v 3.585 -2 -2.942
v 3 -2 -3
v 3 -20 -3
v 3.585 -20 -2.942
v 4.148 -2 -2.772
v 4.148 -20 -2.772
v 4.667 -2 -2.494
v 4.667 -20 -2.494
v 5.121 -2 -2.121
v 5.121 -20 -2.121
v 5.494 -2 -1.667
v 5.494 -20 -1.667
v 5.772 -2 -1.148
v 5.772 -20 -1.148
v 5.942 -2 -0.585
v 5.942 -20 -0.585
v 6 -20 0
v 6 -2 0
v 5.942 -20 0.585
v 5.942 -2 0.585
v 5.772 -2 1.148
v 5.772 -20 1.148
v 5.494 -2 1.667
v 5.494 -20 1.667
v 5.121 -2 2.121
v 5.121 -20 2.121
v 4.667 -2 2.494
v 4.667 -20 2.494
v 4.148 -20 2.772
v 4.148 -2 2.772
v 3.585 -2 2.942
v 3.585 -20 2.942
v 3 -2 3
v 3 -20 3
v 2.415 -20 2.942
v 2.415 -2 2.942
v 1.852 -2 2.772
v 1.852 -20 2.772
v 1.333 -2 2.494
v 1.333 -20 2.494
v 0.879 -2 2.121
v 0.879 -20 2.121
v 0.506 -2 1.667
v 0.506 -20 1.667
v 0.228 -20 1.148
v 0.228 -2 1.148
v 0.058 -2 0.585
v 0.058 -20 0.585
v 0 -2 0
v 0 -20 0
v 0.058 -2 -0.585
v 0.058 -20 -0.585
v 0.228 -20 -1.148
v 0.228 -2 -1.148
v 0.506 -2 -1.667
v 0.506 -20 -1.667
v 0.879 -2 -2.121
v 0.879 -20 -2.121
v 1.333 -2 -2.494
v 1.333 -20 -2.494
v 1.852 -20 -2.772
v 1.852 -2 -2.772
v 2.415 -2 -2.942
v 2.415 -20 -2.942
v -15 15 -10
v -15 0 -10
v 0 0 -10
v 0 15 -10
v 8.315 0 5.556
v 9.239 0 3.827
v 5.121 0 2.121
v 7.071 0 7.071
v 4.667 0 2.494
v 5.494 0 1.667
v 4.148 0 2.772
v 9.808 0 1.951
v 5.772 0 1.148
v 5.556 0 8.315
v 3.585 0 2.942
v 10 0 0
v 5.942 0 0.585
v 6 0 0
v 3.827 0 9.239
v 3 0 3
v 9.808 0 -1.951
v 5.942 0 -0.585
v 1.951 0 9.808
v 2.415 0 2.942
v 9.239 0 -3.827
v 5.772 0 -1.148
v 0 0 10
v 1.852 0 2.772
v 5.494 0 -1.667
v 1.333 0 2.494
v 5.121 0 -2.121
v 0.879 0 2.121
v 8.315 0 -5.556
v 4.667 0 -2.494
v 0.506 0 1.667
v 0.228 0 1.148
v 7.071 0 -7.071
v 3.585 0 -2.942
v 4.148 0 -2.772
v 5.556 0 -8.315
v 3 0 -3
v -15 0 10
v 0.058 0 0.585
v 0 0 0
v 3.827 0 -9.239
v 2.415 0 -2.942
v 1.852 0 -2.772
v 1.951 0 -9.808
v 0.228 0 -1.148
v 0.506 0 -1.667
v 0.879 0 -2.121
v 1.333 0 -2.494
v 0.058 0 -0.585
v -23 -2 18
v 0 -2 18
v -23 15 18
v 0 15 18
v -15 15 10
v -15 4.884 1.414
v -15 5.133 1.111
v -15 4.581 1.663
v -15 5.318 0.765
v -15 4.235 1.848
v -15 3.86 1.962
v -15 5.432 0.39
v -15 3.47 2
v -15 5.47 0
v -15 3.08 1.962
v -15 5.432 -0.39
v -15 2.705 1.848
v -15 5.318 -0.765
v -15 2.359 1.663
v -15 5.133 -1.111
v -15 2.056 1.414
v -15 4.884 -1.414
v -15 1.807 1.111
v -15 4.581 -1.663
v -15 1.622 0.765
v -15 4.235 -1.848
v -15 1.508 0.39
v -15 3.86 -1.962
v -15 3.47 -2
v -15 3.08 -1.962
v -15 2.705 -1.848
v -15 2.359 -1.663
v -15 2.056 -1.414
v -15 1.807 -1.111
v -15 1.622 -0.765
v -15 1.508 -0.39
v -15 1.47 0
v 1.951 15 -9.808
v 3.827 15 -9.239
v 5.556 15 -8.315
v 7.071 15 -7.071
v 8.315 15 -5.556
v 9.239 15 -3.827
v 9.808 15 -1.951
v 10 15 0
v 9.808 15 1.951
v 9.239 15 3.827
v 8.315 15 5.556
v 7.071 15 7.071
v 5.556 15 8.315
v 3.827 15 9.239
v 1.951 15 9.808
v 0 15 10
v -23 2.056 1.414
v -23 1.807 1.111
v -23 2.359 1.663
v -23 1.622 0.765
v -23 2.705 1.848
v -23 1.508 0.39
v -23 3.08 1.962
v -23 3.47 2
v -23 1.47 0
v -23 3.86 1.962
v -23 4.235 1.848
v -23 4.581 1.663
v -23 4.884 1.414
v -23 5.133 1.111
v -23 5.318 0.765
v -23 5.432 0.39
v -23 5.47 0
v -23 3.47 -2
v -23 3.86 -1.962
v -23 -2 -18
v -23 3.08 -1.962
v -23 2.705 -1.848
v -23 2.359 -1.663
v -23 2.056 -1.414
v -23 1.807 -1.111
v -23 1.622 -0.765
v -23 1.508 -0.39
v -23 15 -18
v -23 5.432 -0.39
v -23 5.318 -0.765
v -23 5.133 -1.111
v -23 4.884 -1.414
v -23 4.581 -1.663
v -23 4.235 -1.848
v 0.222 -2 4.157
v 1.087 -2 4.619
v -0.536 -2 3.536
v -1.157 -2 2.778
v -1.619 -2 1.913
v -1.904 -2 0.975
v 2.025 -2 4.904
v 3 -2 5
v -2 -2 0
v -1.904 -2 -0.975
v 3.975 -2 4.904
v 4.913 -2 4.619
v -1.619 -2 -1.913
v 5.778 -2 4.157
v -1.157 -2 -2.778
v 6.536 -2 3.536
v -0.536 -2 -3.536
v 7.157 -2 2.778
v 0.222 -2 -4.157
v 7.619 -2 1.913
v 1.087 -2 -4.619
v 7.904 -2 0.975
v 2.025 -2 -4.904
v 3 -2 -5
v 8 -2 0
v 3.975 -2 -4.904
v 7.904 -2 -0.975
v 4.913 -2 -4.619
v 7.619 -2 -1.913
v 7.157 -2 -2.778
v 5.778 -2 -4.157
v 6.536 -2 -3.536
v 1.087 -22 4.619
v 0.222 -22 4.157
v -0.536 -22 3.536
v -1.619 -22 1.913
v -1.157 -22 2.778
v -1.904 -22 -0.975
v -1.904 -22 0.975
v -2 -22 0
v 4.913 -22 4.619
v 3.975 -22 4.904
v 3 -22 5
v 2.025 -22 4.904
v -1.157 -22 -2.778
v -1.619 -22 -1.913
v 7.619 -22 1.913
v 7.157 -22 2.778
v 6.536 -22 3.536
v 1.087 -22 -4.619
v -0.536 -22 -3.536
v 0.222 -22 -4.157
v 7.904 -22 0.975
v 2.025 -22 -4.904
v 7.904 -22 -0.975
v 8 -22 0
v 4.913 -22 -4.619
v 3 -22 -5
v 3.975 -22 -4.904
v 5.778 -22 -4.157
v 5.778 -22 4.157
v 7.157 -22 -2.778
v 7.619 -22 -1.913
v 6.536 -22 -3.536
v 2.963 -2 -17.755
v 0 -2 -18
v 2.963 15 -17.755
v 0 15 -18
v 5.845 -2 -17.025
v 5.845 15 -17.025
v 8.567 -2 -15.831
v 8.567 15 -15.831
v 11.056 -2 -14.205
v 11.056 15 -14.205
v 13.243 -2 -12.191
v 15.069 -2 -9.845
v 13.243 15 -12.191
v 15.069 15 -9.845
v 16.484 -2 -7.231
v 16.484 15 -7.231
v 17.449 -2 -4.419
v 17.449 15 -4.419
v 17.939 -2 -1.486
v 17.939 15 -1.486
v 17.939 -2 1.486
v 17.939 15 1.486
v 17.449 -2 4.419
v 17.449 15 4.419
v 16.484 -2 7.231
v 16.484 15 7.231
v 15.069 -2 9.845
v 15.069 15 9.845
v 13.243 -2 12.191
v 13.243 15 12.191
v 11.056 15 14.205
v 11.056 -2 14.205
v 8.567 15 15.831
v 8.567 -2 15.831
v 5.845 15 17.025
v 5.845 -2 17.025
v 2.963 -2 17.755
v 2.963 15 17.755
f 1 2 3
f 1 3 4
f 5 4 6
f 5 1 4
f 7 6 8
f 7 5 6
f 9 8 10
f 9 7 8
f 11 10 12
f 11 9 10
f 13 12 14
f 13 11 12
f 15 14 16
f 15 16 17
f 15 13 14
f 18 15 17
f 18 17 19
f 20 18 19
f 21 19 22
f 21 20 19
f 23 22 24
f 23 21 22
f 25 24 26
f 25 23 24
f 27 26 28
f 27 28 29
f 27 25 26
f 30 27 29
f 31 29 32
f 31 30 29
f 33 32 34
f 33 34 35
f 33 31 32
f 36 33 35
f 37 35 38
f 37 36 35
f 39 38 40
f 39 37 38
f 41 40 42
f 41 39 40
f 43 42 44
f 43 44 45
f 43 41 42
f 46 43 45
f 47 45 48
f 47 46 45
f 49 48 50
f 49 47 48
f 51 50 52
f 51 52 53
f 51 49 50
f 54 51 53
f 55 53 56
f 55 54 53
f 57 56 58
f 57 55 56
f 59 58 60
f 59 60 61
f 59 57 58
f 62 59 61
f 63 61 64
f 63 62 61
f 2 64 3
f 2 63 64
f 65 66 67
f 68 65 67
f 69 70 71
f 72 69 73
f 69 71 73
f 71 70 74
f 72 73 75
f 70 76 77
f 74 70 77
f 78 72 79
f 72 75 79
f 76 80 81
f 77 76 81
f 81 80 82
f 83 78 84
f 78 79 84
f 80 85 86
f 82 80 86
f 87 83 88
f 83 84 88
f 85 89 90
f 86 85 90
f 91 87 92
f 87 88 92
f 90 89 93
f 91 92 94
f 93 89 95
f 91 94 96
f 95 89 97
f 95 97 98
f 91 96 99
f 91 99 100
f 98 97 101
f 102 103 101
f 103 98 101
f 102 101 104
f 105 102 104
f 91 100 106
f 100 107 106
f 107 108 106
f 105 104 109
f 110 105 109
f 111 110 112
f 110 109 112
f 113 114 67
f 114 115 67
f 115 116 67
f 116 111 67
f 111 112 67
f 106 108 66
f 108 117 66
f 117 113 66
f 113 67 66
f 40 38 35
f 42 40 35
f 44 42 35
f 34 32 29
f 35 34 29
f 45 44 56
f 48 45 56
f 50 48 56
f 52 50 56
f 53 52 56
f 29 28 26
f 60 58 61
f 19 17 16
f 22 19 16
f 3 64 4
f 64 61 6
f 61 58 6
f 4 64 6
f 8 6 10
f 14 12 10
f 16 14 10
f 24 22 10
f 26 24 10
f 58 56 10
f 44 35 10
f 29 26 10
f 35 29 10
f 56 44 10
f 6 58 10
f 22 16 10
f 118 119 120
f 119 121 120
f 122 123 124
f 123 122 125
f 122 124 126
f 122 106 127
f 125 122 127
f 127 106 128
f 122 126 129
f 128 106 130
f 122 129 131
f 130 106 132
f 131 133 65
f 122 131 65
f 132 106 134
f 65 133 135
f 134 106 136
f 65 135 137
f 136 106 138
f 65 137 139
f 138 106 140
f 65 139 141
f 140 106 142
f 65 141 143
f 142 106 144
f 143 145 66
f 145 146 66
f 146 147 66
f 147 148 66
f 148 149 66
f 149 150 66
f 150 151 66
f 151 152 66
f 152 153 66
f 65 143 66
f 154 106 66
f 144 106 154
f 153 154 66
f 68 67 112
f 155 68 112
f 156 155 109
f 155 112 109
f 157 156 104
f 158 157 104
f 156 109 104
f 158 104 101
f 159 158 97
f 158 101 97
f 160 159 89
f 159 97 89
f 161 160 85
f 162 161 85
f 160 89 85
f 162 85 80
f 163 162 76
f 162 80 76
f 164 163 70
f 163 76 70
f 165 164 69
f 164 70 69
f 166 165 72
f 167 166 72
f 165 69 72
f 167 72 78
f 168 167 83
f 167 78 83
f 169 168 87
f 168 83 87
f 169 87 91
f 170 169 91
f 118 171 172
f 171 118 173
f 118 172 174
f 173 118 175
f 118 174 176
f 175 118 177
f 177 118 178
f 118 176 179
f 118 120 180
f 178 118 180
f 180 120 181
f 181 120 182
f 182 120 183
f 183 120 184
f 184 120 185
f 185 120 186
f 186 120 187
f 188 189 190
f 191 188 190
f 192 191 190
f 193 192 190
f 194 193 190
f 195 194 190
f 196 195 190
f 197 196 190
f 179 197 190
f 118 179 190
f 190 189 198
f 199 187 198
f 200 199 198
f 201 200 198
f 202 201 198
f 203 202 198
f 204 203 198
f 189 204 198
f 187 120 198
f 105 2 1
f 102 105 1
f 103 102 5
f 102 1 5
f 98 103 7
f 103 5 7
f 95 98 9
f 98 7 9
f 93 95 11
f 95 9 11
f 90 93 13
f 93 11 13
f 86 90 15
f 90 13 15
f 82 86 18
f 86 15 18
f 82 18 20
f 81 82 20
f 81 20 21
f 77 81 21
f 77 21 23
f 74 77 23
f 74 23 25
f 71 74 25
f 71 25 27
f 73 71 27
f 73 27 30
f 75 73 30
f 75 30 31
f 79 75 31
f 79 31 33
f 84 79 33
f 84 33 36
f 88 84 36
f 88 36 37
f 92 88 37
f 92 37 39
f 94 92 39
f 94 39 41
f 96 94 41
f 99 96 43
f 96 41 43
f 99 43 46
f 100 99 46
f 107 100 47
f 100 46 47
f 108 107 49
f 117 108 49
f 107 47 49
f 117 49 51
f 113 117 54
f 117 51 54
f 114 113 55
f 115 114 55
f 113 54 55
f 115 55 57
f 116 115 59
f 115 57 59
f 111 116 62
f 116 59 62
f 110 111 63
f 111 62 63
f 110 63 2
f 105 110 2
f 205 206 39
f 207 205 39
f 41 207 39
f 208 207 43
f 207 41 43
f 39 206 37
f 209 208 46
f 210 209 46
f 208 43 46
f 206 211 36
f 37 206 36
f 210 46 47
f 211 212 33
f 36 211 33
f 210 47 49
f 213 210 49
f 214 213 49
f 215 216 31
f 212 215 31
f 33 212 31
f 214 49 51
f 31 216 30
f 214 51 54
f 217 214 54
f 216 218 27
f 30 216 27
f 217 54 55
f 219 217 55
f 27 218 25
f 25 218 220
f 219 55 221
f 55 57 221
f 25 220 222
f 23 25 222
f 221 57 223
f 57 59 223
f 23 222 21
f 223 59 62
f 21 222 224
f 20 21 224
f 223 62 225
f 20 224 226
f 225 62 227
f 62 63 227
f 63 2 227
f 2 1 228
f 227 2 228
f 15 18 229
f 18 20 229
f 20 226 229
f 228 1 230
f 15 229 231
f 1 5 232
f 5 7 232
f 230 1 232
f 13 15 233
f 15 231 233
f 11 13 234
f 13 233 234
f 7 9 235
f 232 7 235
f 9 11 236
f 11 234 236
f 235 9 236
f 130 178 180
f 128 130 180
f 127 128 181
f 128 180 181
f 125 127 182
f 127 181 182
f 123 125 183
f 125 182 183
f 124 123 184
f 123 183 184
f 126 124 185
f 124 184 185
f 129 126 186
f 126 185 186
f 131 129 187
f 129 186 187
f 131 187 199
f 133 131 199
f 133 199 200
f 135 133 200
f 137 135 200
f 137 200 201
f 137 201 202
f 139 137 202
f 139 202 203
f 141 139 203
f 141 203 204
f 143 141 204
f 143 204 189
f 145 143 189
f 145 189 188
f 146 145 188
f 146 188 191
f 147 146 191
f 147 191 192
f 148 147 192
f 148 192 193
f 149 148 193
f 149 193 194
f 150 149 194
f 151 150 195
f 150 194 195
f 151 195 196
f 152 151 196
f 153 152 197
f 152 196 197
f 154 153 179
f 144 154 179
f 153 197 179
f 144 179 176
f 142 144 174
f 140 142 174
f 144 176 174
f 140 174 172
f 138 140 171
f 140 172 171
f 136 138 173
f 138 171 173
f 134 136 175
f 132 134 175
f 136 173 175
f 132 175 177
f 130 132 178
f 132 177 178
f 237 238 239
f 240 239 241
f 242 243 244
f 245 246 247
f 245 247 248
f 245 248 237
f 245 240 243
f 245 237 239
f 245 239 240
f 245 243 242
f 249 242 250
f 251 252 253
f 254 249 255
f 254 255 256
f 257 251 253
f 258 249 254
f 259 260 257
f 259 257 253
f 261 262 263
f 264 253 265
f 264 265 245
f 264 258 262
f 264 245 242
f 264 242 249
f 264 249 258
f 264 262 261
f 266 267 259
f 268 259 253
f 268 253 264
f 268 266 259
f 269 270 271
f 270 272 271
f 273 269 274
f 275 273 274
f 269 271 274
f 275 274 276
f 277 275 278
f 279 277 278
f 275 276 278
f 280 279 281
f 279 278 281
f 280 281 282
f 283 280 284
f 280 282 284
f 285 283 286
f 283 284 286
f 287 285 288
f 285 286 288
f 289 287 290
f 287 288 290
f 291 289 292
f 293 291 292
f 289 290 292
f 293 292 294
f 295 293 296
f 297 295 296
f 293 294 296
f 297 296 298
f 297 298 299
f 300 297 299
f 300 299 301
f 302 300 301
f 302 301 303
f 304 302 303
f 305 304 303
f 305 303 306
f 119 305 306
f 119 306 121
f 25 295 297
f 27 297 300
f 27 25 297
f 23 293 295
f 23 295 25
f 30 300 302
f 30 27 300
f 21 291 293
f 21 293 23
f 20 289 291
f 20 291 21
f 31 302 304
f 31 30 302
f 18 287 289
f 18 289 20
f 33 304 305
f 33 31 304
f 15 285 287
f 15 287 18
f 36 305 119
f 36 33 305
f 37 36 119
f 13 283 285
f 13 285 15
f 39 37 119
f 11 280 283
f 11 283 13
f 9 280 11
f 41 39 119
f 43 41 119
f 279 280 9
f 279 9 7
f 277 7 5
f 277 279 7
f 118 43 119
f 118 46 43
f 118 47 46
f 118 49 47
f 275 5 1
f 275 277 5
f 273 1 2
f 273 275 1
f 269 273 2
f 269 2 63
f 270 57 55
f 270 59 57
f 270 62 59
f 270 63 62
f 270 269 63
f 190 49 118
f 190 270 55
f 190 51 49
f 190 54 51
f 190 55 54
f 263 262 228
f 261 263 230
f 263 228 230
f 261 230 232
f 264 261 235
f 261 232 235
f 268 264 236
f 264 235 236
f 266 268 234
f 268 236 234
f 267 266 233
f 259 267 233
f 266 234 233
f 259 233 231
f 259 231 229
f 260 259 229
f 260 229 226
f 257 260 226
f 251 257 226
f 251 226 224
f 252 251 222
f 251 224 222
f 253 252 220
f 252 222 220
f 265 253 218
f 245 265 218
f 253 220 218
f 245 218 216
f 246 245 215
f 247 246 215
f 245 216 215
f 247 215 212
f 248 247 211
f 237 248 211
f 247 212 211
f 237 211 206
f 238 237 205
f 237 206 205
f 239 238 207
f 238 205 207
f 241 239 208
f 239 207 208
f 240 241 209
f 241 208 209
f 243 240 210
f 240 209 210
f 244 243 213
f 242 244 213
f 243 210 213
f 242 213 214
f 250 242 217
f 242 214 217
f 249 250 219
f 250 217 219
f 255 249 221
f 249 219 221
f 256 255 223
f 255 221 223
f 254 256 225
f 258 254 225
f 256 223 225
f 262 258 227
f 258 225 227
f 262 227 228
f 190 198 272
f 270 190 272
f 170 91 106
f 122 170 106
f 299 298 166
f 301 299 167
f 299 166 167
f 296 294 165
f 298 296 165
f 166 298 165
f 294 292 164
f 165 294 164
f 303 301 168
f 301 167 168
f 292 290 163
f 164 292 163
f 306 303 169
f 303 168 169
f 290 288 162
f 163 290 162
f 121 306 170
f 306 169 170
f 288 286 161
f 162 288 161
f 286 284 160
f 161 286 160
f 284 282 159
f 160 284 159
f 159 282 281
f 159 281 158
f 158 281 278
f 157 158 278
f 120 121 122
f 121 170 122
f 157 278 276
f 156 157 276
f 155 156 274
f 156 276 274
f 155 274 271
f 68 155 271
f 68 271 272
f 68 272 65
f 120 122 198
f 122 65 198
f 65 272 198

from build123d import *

# Parameters (mm, degrees)
BOSS_EXTRUDE1_DEPTH     = 15
BOSS_EXTRUDE2_DEPTH     = 2
SKETCH2_R               = 5
SKETCH2_R_2             = 3
BOSS_EXTRUDE3_DEPTH     = 20
SKETCH2_3_R             = 3
CUT_EXTRUDE1_DEPTH      = 18
CUT_EXTRUDE1_DEPTH_BACK = 36.397740041
SKETCH3_R               = 2
CUT_EXTRUDE2_DEPTH      = 20


with BuildPart() as part:
    # Sketch1 → Boss-Extrude1 (new body)
    with BuildSketch(Plane(origin=(0, 0, 0), x_dir=(1, 0, 0), z_dir=(0, 1, 0))):
        with BuildLine():
            Line((-23, 18), (0, 18))
            ThreePointArc((0, 18), (18, 0), (0, -18))
            Line((0, -18), (-23, -18))
            Line((-23, -18), (-23, 18))
        make_face()
        with BuildLine():
            Line((-15, 10), (0, 10))
            ThreePointArc((0, 10), (10, 0), (0, -10))
            Line((0, -10), (-15, -10))
            Line((-15, -10), (-15, 10))
        make_face(mode=Mode.SUBTRACT)
    extrude(amount=BOSS_EXTRUDE1_DEPTH)

    # Sketch1<2> → Boss-Extrude2 (add)
    with BuildSketch(Plane(origin=(0, 0, 0), x_dir=(1, 0, 0), z_dir=(0, 1, 0))):
        with BuildLine():
            Line((-23, 18), (0, 18))
            ThreePointArc((0, 18), (18, 0), (0, -18))
            Line((0, -18), (-23, -18))
            Line((-23, -18), (-23, 18))
        make_face()
    extrude(amount=-BOSS_EXTRUDE2_DEPTH)

    # Sketch2 → Boss-Extrude3 (add)
    with BuildSketch(Plane(origin=(0, -2, 0), x_dir=(-1, 0, 0), z_dir=(0, -1, 0))):
        with Locations(Location((-3, 0, 0), (0, 0, 90))):
            Circle(SKETCH2_R)
        with Locations((-3, 0)):
            Circle(SKETCH2_R_2, mode=Mode.SUBTRACT)
        with Locations((-3, 0)):
            Circle(SKETCH2_R_2)
    extrude(amount=BOSS_EXTRUDE3_DEPTH)

    # Sketch2<3> → Cut-Extrude1 (cut, two sides)
    with BuildSketch(Plane(origin=(0, -2, 0), x_dir=(-1, 0, 0), z_dir=(0, -1, 0))) as cut_extrude1_sk:
        with Locations(Location((-3, 0, 0), (0, 0, 90))):
            Circle(SKETCH2_3_R)
    extrude(amount=CUT_EXTRUDE1_DEPTH, mode=Mode.SUBTRACT)
    extrude(cut_extrude1_sk.sketch, amount=-CUT_EXTRUDE1_DEPTH_BACK, mode=Mode.SUBTRACT)

    # Sketch3 → Cut-Extrude2 (cut)
    with BuildSketch(Plane.ZY.offset(23)):
        with Locations((0, 3.47)):
            Circle(SKETCH3_R)
    extrude(amount=-CUT_EXTRUDE2_DEPTH, mode=Mode.SUBTRACT)


with BuildPart() as body_2:
    # Split1: the piece on the far side of the plane
    add(part.part)
    split(bisect_by=Plane(origin=(0, -2, 0), x_dir=(0, 0, -1), z_dir=(0, -1, 0)), keep=Keep.BOTTOM)


with BuildPart() as part_1:
    add(part.part)

    # Split1
    split(bisect_by=Plane(origin=(0, -2, 0), x_dir=(0, 0, -1), z_dir=(0, -1, 0)), keep=Keep.TOP)


solid = Compound([body_2.part, part_1.part])
